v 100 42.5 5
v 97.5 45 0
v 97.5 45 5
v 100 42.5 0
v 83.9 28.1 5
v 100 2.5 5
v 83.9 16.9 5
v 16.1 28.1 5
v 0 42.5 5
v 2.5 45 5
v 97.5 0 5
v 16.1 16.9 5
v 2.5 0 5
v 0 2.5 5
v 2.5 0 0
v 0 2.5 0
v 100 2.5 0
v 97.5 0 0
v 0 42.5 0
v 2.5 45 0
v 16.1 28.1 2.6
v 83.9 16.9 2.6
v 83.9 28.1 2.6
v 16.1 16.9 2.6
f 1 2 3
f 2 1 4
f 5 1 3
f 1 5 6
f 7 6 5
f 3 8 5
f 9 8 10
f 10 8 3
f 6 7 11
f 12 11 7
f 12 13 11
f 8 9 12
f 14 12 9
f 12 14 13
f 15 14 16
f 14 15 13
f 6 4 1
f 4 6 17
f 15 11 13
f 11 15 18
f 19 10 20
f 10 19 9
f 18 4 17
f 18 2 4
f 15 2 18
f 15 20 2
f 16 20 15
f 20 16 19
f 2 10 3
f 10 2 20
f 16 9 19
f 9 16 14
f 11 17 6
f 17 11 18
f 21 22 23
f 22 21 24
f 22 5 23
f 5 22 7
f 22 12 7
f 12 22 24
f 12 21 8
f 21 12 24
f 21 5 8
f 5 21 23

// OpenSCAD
$fn = 32;

// ----------------------------------------------------------------------
// Windowed plate: 1 voids, 100 x 45 x 5 mm
// ----------------------------------------------------------------------

// --- parameters (mm) ---
plate_l = 100;            // plate length, X
plate_w = 45;             // plate width, Y
plate_t = 5;              // plate thickness, Z
edge_margin = 12;         // wall from the plate edge to any window
win1_l = 67.8;            // window length
win1_w = 11.2;            // window width
depth_1 = 2.4;            // depth of void 1 (full thickness = through)
corner_c = 2.5;           // corner chamfer of the plate

profile = [[2.5, 0], [97.5, 0], [100, 2.5], [100, 42.5], [97.5, 45], [2.5, 45], [0, 42.5], [0, 2.5]];  // primary outline, 8 points, counter clockwise
void_1 = [[16.1, 16.9], [83.9, 16.9], [83.9, 28.1], [16.1, 28.1]];  // large central window, 4 points

// --- the one profile operation ---
difference() {
  linear_extrude(height = plate_t) polygon(points = profile);
  translate([0, 0, plate_t - depth_1])
    linear_extrude(height = depth_1 + 1) polygon(points = void_1);
}
